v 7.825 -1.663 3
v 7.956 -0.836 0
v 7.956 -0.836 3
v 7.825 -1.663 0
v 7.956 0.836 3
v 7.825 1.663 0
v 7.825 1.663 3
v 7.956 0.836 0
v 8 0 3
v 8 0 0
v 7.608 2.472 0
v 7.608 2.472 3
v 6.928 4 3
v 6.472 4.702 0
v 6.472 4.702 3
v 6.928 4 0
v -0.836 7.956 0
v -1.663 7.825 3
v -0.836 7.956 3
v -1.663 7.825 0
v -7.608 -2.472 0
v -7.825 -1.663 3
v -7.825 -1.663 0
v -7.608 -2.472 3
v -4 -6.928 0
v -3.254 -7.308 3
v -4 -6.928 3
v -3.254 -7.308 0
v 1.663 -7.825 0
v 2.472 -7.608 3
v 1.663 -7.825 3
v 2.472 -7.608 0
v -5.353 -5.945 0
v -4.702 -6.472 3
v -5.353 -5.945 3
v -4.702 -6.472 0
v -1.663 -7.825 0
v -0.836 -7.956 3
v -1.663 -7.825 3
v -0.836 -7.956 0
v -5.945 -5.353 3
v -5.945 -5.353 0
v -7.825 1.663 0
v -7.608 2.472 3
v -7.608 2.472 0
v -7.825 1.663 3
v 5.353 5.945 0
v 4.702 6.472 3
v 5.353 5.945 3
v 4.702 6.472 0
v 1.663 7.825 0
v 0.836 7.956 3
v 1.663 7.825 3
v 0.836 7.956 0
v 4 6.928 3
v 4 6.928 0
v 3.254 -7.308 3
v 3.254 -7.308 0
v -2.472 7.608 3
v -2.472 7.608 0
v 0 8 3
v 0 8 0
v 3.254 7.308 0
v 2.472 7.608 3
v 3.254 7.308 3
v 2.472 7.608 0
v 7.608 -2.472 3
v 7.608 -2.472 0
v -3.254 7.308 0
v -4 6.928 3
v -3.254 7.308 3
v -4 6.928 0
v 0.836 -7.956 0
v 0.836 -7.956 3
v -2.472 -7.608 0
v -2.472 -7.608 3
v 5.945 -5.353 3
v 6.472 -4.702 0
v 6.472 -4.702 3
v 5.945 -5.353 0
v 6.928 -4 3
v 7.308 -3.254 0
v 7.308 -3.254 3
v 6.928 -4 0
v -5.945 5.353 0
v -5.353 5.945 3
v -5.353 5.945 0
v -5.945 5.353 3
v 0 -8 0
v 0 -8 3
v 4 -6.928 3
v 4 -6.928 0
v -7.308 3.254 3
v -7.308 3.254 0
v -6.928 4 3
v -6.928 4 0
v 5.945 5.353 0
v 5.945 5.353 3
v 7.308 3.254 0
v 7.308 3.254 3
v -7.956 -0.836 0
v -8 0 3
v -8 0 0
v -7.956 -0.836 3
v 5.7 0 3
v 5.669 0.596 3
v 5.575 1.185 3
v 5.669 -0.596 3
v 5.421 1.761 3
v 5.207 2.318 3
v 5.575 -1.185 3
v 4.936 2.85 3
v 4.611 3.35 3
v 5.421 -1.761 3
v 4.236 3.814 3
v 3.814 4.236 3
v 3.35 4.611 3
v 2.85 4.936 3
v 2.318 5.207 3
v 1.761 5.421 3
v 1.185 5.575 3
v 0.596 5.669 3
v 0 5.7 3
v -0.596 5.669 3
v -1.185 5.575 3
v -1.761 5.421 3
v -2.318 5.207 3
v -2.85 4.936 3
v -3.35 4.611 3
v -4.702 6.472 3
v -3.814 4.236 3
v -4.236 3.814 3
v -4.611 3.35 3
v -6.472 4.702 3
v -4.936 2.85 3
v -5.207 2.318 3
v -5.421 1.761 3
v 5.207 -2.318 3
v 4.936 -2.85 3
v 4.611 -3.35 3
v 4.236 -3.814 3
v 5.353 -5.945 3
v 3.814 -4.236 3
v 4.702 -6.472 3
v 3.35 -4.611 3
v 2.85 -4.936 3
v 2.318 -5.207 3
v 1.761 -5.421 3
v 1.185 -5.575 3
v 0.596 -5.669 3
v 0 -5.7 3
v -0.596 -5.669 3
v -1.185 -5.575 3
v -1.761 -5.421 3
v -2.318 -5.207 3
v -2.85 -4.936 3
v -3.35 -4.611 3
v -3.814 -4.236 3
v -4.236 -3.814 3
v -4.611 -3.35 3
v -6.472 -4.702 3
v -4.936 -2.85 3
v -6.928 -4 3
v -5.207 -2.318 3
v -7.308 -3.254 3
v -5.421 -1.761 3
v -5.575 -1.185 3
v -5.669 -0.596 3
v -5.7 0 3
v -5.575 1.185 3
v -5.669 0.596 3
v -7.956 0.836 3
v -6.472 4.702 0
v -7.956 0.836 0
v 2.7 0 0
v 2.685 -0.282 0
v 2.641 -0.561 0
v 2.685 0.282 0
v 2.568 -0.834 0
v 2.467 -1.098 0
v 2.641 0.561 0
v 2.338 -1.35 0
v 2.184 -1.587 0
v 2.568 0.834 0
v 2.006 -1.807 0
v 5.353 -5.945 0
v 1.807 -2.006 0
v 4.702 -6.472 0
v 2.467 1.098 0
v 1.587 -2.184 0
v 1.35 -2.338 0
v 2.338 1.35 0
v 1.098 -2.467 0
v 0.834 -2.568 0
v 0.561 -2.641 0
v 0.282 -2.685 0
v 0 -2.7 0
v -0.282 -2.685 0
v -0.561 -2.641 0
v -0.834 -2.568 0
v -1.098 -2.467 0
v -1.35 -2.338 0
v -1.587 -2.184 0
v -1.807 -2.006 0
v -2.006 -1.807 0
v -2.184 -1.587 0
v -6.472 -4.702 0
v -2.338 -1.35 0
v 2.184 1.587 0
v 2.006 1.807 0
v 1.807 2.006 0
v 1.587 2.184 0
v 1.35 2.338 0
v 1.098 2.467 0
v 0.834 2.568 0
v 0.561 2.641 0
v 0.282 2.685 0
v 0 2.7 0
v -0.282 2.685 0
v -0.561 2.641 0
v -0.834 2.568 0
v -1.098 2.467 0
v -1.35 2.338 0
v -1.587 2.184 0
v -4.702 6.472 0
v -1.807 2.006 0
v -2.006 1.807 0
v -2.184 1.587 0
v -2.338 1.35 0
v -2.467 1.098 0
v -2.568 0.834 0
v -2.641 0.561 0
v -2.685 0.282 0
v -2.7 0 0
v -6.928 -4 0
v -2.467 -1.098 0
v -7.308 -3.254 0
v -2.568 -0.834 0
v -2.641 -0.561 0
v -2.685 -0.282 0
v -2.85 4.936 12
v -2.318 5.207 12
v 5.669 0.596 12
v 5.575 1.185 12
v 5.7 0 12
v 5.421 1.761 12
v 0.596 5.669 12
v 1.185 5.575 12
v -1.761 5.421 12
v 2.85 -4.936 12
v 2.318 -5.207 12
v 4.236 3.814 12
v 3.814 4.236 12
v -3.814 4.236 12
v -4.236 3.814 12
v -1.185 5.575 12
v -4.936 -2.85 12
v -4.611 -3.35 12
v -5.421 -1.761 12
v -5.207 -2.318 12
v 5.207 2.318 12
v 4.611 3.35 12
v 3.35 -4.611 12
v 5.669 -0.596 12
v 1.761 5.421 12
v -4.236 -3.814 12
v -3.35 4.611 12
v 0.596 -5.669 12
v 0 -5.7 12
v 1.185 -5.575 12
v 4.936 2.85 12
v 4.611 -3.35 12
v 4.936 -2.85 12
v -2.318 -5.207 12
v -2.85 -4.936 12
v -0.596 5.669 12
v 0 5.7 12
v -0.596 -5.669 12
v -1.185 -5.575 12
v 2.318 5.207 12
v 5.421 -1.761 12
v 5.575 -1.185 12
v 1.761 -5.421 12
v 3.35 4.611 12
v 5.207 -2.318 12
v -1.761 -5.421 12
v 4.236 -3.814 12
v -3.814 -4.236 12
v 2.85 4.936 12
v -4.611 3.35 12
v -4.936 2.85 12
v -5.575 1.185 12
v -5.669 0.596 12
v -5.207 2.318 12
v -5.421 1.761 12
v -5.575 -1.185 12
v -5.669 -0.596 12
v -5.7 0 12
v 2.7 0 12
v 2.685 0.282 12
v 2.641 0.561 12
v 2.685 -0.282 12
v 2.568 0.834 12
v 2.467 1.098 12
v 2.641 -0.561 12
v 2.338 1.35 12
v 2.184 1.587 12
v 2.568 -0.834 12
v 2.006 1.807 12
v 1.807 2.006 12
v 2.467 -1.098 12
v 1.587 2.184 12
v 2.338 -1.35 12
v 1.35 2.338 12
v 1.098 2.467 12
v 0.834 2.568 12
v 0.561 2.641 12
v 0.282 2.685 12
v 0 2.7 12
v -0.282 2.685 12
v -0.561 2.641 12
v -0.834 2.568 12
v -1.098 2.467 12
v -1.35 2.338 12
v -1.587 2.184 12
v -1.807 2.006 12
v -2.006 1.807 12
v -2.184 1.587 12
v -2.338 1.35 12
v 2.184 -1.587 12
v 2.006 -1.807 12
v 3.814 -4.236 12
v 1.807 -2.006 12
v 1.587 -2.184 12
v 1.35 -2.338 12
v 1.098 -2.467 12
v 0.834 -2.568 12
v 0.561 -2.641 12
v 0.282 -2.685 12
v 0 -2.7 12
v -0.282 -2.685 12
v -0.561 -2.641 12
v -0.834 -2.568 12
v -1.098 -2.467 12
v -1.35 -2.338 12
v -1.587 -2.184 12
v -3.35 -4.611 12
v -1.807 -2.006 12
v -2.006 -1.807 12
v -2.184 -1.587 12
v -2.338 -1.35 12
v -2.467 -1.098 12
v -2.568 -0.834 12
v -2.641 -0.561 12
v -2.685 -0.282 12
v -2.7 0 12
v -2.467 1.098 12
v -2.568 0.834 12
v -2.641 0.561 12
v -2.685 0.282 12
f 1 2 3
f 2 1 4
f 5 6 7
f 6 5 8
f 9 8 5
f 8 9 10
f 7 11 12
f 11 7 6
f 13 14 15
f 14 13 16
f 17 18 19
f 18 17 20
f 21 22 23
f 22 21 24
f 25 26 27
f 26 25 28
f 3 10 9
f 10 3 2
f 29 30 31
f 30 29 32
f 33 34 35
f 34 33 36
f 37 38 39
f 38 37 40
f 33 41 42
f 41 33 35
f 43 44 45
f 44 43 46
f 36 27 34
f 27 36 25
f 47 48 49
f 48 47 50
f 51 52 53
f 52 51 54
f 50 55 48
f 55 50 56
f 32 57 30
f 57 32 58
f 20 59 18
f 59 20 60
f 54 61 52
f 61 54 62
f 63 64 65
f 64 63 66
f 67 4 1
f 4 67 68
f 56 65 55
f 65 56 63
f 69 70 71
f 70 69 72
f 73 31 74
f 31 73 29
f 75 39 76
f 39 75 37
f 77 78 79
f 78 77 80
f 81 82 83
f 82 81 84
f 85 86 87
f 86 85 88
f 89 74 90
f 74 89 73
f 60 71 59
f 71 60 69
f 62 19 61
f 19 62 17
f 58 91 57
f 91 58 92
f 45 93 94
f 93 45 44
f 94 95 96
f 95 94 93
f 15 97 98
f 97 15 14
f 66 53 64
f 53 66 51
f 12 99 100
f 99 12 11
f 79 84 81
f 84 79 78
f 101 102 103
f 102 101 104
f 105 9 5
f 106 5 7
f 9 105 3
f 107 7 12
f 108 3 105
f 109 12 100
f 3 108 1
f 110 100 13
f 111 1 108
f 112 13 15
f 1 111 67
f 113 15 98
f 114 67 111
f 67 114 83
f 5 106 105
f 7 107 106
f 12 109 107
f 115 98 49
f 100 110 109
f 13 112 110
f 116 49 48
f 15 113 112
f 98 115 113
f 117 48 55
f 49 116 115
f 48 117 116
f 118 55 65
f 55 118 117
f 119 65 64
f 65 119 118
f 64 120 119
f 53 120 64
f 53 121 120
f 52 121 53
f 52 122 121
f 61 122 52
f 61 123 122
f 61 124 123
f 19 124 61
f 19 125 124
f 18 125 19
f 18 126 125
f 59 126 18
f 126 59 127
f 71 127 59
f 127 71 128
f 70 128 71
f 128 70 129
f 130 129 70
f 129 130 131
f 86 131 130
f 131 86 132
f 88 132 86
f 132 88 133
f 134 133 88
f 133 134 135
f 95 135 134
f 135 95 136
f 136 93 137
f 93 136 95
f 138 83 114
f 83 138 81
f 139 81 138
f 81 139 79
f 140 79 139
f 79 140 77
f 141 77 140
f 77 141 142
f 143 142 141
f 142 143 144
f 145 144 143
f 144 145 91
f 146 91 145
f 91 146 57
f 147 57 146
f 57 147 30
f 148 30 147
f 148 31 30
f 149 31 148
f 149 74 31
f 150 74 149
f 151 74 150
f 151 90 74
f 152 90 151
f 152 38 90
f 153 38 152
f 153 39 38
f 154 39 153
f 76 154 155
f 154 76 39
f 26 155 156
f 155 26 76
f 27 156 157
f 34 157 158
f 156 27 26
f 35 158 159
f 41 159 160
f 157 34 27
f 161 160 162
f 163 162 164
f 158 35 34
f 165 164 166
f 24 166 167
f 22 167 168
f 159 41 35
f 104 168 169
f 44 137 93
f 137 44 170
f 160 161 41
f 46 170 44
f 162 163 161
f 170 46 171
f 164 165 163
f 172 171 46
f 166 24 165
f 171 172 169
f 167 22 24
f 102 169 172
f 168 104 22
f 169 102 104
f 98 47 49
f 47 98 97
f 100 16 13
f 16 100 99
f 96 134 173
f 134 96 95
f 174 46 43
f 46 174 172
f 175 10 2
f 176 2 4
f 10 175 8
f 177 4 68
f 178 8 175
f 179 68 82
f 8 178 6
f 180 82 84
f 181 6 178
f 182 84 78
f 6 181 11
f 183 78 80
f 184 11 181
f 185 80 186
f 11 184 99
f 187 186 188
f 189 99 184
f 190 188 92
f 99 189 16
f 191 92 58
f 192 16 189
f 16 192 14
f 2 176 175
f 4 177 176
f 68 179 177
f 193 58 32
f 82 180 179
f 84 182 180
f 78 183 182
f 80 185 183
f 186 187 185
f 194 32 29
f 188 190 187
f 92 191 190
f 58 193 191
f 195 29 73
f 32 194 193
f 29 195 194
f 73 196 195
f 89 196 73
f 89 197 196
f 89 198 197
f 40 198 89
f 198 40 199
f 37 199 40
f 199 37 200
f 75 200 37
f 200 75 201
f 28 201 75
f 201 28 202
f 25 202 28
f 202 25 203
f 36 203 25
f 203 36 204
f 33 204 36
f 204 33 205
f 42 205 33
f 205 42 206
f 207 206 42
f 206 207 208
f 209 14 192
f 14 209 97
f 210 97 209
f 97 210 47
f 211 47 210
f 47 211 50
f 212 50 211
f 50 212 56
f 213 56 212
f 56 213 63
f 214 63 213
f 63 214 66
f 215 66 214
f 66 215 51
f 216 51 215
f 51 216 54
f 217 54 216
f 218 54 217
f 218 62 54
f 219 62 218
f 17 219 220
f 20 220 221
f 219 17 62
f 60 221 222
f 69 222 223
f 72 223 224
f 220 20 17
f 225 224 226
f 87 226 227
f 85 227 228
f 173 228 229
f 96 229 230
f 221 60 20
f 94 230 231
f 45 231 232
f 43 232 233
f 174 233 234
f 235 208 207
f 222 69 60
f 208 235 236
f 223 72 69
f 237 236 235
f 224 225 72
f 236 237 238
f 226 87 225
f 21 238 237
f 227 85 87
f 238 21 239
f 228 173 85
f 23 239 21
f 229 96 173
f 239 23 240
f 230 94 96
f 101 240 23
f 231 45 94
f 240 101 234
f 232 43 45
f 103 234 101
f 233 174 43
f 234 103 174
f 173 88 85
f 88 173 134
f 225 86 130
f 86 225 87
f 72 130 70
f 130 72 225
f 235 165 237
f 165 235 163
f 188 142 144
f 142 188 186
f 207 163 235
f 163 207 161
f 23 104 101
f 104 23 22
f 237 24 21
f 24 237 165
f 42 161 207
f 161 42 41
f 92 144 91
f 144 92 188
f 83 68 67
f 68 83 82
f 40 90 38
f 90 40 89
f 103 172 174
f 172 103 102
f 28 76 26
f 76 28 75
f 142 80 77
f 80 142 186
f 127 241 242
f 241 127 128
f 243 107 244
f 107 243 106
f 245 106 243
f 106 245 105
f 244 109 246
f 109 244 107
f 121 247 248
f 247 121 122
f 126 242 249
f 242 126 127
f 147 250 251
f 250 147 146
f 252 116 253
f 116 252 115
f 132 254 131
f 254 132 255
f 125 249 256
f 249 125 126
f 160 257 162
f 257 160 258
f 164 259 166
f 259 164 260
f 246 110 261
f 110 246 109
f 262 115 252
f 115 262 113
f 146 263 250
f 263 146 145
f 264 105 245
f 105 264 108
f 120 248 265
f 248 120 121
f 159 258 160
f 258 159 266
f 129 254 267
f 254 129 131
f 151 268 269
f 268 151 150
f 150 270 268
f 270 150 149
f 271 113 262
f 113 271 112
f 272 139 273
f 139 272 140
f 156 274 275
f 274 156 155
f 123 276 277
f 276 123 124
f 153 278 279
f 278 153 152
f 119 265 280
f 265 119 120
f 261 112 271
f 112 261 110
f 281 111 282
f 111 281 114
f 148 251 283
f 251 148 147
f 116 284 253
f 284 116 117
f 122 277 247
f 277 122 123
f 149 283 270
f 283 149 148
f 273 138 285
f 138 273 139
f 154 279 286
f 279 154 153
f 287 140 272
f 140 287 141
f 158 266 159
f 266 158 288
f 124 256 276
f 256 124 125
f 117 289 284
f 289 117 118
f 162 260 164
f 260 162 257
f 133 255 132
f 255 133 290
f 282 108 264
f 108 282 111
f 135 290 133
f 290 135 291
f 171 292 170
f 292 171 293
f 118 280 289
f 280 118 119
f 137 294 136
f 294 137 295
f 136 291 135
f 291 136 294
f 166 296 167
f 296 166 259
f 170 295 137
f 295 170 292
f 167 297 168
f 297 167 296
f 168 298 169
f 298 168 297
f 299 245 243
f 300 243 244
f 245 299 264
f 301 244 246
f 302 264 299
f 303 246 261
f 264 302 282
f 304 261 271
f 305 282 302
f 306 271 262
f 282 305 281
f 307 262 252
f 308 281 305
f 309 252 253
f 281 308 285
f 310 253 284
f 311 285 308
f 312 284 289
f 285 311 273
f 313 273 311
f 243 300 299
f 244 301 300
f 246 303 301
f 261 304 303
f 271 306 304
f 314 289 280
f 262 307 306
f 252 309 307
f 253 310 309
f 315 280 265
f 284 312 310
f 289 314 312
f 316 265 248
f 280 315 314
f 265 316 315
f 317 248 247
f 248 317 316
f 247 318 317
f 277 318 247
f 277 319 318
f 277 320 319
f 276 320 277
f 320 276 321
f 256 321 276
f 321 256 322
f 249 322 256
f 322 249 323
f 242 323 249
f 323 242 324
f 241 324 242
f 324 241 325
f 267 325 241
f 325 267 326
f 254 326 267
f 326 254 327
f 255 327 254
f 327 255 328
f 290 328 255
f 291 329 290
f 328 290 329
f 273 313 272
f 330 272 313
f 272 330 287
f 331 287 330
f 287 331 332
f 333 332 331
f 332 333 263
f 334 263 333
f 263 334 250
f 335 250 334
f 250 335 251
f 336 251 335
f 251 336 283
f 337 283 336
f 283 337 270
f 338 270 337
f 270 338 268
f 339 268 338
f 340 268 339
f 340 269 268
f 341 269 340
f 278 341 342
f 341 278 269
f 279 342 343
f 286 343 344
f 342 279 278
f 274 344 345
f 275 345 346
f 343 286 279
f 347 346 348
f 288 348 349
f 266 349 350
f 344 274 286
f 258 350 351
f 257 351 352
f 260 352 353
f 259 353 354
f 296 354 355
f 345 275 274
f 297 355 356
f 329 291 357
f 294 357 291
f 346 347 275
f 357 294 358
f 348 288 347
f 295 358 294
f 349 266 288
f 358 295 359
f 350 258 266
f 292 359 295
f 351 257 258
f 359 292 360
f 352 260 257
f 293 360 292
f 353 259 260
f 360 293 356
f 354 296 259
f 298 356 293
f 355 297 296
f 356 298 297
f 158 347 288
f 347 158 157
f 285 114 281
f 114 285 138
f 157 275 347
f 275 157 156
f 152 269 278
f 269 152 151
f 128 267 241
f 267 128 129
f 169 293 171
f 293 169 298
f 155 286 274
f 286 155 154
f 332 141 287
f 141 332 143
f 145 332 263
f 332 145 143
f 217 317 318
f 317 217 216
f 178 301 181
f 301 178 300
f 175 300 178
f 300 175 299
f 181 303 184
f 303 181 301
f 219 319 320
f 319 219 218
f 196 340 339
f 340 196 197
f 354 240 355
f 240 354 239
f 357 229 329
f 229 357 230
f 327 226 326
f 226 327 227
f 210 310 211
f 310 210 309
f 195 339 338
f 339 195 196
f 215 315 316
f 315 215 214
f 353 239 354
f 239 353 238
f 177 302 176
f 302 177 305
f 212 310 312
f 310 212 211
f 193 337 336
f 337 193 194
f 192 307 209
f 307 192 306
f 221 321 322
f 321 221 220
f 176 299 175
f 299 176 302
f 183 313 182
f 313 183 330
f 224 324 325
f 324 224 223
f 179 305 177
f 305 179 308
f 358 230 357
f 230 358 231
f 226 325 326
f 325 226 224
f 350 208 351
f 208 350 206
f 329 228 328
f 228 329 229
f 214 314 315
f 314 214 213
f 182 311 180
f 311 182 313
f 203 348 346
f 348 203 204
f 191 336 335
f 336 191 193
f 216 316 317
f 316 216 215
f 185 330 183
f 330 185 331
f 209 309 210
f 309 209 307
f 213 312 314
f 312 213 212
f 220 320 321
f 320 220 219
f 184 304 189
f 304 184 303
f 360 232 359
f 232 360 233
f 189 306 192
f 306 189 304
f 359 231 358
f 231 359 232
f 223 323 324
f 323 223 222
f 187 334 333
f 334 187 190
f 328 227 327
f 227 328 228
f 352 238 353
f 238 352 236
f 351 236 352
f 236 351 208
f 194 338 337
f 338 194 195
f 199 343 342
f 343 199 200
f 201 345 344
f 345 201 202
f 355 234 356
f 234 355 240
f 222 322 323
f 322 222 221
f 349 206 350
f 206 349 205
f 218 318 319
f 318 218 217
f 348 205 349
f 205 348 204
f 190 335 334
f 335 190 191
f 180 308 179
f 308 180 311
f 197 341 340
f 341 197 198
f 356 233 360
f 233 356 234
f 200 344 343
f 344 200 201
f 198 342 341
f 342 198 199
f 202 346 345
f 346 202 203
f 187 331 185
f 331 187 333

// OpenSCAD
// Threaded mounting boss.
$fn = 60;
eps = 0.02;
thread_d = 5.4;
base_d = 16;
height = 12;
difference() { union() { cylinder(d=base_d,h=3); cylinder(d=thread_d+6,h=height); } translate([0,0,-eps]) cylinder(d=thread_d,h=height+2*eps); }
